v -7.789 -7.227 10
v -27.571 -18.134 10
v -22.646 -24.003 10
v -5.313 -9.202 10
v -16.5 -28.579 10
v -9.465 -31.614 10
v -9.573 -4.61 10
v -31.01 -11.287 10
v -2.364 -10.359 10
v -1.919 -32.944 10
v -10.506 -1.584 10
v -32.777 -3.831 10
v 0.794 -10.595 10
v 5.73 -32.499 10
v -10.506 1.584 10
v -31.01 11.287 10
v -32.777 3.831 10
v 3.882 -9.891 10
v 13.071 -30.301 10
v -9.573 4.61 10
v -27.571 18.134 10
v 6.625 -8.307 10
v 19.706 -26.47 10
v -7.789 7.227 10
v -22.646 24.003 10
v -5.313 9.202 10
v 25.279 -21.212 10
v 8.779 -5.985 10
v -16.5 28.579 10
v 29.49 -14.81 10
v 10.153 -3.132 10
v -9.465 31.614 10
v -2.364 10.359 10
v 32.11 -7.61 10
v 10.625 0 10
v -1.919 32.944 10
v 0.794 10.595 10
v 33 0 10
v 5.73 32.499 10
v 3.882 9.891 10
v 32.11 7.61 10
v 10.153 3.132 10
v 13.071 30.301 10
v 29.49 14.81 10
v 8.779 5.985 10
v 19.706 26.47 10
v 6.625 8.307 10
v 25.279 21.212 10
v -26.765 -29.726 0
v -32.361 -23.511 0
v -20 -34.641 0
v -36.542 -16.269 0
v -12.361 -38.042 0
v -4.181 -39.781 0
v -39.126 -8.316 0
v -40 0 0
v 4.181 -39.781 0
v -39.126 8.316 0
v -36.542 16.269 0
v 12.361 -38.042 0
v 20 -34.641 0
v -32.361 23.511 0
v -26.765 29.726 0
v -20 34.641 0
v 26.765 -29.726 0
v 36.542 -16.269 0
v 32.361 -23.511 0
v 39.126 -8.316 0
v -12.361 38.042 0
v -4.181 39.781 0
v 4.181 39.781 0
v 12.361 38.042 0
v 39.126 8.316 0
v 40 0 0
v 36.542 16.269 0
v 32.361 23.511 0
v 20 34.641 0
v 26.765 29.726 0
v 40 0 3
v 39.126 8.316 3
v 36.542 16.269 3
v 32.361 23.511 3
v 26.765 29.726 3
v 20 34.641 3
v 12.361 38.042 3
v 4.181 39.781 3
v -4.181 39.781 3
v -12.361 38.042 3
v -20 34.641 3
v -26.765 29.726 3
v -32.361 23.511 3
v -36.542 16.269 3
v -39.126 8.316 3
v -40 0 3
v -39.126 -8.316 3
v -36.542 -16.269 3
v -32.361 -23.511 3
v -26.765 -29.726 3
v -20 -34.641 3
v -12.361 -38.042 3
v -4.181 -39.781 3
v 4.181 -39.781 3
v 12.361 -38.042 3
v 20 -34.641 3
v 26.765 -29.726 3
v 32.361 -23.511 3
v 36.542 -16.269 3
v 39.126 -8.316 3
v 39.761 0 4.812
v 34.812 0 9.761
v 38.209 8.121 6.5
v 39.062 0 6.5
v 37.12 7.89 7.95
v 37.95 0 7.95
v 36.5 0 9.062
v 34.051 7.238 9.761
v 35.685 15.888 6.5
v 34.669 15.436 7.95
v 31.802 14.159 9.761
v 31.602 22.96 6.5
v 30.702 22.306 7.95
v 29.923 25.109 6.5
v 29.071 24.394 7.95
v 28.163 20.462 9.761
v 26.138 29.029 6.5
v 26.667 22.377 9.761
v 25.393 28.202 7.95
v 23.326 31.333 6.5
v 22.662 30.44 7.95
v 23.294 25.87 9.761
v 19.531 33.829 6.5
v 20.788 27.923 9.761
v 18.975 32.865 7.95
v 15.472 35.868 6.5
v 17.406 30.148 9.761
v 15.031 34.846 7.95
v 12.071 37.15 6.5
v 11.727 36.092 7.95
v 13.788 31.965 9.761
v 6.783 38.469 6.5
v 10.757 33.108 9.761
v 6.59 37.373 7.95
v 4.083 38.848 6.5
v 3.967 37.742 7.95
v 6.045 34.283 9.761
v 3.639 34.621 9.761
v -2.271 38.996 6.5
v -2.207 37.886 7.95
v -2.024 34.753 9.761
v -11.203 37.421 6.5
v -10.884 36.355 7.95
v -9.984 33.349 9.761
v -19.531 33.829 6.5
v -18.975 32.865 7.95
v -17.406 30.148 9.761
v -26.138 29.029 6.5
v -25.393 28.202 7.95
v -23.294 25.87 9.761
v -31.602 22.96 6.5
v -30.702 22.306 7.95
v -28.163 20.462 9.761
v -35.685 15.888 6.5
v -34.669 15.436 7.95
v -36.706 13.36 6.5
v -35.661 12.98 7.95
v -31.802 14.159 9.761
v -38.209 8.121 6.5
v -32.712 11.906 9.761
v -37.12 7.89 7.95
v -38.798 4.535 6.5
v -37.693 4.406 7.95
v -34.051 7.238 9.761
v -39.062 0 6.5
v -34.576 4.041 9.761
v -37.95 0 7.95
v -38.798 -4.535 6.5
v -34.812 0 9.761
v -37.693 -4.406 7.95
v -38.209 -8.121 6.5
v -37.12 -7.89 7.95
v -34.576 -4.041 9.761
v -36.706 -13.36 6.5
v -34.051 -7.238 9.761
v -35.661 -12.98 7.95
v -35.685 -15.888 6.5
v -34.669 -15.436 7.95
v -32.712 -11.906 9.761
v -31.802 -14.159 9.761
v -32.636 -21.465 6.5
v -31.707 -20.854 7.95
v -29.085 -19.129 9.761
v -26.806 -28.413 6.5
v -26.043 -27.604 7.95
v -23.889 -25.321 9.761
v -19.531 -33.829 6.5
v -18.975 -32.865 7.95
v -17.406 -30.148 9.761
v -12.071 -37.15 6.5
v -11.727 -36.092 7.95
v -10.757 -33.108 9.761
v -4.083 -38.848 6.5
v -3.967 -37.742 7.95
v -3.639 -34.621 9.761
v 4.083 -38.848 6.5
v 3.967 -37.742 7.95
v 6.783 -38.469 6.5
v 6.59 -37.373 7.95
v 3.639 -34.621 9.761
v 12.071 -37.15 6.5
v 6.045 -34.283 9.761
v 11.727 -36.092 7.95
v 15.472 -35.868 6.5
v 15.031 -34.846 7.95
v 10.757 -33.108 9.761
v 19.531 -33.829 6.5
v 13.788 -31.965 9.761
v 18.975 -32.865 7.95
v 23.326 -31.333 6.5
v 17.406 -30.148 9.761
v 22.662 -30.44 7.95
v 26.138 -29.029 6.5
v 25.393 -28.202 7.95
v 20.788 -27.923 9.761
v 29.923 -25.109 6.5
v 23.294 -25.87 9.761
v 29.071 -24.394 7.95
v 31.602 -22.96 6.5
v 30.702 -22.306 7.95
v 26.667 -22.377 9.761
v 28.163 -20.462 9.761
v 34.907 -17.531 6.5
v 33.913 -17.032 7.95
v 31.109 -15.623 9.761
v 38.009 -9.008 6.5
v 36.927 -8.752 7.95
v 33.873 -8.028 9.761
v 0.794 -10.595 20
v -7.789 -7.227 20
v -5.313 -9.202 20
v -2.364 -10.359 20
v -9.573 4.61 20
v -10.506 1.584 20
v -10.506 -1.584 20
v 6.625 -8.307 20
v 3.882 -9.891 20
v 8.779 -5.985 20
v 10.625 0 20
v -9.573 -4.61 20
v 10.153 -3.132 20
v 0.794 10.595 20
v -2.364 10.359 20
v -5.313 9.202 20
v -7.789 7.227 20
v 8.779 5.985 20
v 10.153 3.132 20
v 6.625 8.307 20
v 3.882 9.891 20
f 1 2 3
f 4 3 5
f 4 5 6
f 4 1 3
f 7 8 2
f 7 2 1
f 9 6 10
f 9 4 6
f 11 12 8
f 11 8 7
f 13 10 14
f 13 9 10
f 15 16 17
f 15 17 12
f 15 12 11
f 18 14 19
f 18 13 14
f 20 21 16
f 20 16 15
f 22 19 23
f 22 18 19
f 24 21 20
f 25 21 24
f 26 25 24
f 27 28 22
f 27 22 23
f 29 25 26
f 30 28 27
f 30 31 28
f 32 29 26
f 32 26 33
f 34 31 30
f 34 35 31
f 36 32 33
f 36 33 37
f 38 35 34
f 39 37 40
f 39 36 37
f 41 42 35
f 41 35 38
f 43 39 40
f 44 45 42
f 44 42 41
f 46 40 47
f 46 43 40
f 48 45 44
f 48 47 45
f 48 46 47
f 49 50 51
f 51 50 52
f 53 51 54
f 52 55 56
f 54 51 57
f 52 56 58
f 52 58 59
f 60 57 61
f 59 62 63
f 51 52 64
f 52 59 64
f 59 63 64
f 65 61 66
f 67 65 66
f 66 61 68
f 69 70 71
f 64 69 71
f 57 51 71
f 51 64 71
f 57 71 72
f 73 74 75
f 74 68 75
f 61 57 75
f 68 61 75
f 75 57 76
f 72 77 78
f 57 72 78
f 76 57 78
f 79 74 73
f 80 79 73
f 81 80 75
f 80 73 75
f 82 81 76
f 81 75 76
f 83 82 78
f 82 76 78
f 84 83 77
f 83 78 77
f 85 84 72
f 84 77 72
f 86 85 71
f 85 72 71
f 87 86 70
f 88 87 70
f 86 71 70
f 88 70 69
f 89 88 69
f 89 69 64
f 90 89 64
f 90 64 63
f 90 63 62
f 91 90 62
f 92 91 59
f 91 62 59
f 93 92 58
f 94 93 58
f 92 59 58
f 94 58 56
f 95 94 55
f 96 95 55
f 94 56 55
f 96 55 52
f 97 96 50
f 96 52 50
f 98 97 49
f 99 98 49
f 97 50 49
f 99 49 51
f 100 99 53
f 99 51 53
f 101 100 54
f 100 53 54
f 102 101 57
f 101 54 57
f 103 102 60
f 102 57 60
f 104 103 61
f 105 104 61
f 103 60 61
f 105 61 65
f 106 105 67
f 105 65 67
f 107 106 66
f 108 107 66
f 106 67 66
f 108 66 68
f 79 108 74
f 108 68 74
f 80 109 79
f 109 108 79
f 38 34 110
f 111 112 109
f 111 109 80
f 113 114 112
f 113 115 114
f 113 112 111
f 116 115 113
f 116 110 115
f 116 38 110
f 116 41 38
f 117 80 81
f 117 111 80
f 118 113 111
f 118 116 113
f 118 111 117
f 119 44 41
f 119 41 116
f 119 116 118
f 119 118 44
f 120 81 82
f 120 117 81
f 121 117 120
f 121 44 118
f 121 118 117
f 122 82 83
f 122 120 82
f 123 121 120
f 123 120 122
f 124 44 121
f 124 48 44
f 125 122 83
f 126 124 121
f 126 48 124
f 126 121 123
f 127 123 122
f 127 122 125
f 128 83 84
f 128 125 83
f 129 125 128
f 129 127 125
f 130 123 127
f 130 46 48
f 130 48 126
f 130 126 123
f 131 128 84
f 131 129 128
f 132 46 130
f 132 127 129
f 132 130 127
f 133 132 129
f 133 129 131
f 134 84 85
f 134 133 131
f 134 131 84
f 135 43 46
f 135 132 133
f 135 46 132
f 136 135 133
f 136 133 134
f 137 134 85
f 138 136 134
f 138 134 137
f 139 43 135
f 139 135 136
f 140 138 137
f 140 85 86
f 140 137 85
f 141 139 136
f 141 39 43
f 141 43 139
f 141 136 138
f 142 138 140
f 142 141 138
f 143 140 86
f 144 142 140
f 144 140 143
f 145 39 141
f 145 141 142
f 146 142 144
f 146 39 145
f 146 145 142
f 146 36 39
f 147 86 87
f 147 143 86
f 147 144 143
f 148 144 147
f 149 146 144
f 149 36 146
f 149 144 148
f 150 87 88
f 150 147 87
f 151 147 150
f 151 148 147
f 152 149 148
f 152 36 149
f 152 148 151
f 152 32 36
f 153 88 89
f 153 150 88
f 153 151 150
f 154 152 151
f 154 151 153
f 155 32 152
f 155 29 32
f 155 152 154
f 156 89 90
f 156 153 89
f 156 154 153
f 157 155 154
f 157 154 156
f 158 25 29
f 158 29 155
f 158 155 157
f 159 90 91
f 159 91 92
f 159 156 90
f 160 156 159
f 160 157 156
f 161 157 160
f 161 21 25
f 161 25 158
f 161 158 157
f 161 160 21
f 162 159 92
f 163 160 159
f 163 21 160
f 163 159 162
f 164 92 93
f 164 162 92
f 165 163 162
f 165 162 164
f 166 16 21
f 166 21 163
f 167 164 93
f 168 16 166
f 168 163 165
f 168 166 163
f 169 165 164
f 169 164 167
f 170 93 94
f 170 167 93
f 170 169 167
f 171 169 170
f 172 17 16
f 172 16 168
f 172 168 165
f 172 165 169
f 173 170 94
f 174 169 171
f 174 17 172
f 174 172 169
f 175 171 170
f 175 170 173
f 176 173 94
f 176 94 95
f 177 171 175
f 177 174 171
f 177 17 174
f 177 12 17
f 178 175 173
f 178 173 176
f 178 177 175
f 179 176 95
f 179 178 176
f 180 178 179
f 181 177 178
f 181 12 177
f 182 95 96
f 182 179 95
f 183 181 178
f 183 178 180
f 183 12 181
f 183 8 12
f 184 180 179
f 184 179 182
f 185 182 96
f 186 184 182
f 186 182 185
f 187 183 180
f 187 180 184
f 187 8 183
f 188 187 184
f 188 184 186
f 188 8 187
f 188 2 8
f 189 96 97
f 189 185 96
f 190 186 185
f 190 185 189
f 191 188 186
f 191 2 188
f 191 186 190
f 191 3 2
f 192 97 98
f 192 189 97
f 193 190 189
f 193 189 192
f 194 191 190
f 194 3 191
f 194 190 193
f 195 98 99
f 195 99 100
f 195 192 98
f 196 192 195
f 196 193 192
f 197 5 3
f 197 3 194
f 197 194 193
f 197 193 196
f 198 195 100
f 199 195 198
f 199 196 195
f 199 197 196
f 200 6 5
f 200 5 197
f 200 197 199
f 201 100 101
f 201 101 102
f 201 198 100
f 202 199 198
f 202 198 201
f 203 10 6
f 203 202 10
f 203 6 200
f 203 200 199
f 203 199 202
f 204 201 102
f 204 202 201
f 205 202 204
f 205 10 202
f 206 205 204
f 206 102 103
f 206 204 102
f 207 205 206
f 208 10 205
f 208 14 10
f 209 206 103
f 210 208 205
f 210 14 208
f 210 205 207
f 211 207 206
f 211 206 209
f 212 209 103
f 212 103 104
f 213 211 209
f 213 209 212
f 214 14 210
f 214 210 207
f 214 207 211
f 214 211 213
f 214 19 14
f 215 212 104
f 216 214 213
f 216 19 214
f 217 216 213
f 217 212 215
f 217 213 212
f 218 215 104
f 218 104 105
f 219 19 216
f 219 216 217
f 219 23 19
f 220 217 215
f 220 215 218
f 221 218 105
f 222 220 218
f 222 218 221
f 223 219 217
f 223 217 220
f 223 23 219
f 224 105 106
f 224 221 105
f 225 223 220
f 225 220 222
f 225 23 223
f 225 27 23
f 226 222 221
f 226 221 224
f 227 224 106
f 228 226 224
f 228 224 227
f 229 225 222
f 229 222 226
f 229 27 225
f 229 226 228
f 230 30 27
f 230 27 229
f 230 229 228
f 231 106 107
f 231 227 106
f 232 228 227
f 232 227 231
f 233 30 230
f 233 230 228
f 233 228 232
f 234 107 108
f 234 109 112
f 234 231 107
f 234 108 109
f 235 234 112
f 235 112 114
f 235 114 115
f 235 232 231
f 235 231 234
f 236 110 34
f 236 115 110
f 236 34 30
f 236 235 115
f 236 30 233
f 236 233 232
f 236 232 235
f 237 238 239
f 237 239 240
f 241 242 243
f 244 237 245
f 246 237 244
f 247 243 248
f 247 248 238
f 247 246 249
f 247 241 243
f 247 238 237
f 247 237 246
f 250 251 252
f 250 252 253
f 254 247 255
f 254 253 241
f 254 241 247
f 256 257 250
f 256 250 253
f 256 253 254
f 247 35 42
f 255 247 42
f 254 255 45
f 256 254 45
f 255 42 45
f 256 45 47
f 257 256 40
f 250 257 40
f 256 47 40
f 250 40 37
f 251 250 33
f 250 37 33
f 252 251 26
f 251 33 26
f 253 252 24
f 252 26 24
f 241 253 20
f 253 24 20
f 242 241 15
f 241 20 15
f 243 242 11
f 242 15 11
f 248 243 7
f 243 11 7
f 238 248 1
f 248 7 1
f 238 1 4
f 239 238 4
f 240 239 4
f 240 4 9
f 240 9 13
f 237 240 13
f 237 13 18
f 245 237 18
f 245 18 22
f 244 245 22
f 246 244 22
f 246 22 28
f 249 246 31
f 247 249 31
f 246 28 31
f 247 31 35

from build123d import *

# Parameters (mm, degrees)
F0_R     = 40
F1_DEPTH = 10
F2_R     = 7
F3_R     = 10.625
F4_DEPTH = 10


with BuildPart() as f1:
    # F0 (on Top) → F1 (new body)
    with BuildSketch(Plane.XY):
        Circle(F0_R)
    extrude(amount=F1_DEPTH)

    # F2
    f2_edges = [f1.edges().sort_by_distance(p)[0] for p in [
        (-40, 0, 10),
    ]]
    fillet(f2_edges, radius=F2_R)

    # F3 (on face) → F4 (join)
    with BuildSketch(Plane.XY.offset(10)):
        Circle(F3_R)
    extrude(amount=F4_DEPTH)


solid = f1.part
